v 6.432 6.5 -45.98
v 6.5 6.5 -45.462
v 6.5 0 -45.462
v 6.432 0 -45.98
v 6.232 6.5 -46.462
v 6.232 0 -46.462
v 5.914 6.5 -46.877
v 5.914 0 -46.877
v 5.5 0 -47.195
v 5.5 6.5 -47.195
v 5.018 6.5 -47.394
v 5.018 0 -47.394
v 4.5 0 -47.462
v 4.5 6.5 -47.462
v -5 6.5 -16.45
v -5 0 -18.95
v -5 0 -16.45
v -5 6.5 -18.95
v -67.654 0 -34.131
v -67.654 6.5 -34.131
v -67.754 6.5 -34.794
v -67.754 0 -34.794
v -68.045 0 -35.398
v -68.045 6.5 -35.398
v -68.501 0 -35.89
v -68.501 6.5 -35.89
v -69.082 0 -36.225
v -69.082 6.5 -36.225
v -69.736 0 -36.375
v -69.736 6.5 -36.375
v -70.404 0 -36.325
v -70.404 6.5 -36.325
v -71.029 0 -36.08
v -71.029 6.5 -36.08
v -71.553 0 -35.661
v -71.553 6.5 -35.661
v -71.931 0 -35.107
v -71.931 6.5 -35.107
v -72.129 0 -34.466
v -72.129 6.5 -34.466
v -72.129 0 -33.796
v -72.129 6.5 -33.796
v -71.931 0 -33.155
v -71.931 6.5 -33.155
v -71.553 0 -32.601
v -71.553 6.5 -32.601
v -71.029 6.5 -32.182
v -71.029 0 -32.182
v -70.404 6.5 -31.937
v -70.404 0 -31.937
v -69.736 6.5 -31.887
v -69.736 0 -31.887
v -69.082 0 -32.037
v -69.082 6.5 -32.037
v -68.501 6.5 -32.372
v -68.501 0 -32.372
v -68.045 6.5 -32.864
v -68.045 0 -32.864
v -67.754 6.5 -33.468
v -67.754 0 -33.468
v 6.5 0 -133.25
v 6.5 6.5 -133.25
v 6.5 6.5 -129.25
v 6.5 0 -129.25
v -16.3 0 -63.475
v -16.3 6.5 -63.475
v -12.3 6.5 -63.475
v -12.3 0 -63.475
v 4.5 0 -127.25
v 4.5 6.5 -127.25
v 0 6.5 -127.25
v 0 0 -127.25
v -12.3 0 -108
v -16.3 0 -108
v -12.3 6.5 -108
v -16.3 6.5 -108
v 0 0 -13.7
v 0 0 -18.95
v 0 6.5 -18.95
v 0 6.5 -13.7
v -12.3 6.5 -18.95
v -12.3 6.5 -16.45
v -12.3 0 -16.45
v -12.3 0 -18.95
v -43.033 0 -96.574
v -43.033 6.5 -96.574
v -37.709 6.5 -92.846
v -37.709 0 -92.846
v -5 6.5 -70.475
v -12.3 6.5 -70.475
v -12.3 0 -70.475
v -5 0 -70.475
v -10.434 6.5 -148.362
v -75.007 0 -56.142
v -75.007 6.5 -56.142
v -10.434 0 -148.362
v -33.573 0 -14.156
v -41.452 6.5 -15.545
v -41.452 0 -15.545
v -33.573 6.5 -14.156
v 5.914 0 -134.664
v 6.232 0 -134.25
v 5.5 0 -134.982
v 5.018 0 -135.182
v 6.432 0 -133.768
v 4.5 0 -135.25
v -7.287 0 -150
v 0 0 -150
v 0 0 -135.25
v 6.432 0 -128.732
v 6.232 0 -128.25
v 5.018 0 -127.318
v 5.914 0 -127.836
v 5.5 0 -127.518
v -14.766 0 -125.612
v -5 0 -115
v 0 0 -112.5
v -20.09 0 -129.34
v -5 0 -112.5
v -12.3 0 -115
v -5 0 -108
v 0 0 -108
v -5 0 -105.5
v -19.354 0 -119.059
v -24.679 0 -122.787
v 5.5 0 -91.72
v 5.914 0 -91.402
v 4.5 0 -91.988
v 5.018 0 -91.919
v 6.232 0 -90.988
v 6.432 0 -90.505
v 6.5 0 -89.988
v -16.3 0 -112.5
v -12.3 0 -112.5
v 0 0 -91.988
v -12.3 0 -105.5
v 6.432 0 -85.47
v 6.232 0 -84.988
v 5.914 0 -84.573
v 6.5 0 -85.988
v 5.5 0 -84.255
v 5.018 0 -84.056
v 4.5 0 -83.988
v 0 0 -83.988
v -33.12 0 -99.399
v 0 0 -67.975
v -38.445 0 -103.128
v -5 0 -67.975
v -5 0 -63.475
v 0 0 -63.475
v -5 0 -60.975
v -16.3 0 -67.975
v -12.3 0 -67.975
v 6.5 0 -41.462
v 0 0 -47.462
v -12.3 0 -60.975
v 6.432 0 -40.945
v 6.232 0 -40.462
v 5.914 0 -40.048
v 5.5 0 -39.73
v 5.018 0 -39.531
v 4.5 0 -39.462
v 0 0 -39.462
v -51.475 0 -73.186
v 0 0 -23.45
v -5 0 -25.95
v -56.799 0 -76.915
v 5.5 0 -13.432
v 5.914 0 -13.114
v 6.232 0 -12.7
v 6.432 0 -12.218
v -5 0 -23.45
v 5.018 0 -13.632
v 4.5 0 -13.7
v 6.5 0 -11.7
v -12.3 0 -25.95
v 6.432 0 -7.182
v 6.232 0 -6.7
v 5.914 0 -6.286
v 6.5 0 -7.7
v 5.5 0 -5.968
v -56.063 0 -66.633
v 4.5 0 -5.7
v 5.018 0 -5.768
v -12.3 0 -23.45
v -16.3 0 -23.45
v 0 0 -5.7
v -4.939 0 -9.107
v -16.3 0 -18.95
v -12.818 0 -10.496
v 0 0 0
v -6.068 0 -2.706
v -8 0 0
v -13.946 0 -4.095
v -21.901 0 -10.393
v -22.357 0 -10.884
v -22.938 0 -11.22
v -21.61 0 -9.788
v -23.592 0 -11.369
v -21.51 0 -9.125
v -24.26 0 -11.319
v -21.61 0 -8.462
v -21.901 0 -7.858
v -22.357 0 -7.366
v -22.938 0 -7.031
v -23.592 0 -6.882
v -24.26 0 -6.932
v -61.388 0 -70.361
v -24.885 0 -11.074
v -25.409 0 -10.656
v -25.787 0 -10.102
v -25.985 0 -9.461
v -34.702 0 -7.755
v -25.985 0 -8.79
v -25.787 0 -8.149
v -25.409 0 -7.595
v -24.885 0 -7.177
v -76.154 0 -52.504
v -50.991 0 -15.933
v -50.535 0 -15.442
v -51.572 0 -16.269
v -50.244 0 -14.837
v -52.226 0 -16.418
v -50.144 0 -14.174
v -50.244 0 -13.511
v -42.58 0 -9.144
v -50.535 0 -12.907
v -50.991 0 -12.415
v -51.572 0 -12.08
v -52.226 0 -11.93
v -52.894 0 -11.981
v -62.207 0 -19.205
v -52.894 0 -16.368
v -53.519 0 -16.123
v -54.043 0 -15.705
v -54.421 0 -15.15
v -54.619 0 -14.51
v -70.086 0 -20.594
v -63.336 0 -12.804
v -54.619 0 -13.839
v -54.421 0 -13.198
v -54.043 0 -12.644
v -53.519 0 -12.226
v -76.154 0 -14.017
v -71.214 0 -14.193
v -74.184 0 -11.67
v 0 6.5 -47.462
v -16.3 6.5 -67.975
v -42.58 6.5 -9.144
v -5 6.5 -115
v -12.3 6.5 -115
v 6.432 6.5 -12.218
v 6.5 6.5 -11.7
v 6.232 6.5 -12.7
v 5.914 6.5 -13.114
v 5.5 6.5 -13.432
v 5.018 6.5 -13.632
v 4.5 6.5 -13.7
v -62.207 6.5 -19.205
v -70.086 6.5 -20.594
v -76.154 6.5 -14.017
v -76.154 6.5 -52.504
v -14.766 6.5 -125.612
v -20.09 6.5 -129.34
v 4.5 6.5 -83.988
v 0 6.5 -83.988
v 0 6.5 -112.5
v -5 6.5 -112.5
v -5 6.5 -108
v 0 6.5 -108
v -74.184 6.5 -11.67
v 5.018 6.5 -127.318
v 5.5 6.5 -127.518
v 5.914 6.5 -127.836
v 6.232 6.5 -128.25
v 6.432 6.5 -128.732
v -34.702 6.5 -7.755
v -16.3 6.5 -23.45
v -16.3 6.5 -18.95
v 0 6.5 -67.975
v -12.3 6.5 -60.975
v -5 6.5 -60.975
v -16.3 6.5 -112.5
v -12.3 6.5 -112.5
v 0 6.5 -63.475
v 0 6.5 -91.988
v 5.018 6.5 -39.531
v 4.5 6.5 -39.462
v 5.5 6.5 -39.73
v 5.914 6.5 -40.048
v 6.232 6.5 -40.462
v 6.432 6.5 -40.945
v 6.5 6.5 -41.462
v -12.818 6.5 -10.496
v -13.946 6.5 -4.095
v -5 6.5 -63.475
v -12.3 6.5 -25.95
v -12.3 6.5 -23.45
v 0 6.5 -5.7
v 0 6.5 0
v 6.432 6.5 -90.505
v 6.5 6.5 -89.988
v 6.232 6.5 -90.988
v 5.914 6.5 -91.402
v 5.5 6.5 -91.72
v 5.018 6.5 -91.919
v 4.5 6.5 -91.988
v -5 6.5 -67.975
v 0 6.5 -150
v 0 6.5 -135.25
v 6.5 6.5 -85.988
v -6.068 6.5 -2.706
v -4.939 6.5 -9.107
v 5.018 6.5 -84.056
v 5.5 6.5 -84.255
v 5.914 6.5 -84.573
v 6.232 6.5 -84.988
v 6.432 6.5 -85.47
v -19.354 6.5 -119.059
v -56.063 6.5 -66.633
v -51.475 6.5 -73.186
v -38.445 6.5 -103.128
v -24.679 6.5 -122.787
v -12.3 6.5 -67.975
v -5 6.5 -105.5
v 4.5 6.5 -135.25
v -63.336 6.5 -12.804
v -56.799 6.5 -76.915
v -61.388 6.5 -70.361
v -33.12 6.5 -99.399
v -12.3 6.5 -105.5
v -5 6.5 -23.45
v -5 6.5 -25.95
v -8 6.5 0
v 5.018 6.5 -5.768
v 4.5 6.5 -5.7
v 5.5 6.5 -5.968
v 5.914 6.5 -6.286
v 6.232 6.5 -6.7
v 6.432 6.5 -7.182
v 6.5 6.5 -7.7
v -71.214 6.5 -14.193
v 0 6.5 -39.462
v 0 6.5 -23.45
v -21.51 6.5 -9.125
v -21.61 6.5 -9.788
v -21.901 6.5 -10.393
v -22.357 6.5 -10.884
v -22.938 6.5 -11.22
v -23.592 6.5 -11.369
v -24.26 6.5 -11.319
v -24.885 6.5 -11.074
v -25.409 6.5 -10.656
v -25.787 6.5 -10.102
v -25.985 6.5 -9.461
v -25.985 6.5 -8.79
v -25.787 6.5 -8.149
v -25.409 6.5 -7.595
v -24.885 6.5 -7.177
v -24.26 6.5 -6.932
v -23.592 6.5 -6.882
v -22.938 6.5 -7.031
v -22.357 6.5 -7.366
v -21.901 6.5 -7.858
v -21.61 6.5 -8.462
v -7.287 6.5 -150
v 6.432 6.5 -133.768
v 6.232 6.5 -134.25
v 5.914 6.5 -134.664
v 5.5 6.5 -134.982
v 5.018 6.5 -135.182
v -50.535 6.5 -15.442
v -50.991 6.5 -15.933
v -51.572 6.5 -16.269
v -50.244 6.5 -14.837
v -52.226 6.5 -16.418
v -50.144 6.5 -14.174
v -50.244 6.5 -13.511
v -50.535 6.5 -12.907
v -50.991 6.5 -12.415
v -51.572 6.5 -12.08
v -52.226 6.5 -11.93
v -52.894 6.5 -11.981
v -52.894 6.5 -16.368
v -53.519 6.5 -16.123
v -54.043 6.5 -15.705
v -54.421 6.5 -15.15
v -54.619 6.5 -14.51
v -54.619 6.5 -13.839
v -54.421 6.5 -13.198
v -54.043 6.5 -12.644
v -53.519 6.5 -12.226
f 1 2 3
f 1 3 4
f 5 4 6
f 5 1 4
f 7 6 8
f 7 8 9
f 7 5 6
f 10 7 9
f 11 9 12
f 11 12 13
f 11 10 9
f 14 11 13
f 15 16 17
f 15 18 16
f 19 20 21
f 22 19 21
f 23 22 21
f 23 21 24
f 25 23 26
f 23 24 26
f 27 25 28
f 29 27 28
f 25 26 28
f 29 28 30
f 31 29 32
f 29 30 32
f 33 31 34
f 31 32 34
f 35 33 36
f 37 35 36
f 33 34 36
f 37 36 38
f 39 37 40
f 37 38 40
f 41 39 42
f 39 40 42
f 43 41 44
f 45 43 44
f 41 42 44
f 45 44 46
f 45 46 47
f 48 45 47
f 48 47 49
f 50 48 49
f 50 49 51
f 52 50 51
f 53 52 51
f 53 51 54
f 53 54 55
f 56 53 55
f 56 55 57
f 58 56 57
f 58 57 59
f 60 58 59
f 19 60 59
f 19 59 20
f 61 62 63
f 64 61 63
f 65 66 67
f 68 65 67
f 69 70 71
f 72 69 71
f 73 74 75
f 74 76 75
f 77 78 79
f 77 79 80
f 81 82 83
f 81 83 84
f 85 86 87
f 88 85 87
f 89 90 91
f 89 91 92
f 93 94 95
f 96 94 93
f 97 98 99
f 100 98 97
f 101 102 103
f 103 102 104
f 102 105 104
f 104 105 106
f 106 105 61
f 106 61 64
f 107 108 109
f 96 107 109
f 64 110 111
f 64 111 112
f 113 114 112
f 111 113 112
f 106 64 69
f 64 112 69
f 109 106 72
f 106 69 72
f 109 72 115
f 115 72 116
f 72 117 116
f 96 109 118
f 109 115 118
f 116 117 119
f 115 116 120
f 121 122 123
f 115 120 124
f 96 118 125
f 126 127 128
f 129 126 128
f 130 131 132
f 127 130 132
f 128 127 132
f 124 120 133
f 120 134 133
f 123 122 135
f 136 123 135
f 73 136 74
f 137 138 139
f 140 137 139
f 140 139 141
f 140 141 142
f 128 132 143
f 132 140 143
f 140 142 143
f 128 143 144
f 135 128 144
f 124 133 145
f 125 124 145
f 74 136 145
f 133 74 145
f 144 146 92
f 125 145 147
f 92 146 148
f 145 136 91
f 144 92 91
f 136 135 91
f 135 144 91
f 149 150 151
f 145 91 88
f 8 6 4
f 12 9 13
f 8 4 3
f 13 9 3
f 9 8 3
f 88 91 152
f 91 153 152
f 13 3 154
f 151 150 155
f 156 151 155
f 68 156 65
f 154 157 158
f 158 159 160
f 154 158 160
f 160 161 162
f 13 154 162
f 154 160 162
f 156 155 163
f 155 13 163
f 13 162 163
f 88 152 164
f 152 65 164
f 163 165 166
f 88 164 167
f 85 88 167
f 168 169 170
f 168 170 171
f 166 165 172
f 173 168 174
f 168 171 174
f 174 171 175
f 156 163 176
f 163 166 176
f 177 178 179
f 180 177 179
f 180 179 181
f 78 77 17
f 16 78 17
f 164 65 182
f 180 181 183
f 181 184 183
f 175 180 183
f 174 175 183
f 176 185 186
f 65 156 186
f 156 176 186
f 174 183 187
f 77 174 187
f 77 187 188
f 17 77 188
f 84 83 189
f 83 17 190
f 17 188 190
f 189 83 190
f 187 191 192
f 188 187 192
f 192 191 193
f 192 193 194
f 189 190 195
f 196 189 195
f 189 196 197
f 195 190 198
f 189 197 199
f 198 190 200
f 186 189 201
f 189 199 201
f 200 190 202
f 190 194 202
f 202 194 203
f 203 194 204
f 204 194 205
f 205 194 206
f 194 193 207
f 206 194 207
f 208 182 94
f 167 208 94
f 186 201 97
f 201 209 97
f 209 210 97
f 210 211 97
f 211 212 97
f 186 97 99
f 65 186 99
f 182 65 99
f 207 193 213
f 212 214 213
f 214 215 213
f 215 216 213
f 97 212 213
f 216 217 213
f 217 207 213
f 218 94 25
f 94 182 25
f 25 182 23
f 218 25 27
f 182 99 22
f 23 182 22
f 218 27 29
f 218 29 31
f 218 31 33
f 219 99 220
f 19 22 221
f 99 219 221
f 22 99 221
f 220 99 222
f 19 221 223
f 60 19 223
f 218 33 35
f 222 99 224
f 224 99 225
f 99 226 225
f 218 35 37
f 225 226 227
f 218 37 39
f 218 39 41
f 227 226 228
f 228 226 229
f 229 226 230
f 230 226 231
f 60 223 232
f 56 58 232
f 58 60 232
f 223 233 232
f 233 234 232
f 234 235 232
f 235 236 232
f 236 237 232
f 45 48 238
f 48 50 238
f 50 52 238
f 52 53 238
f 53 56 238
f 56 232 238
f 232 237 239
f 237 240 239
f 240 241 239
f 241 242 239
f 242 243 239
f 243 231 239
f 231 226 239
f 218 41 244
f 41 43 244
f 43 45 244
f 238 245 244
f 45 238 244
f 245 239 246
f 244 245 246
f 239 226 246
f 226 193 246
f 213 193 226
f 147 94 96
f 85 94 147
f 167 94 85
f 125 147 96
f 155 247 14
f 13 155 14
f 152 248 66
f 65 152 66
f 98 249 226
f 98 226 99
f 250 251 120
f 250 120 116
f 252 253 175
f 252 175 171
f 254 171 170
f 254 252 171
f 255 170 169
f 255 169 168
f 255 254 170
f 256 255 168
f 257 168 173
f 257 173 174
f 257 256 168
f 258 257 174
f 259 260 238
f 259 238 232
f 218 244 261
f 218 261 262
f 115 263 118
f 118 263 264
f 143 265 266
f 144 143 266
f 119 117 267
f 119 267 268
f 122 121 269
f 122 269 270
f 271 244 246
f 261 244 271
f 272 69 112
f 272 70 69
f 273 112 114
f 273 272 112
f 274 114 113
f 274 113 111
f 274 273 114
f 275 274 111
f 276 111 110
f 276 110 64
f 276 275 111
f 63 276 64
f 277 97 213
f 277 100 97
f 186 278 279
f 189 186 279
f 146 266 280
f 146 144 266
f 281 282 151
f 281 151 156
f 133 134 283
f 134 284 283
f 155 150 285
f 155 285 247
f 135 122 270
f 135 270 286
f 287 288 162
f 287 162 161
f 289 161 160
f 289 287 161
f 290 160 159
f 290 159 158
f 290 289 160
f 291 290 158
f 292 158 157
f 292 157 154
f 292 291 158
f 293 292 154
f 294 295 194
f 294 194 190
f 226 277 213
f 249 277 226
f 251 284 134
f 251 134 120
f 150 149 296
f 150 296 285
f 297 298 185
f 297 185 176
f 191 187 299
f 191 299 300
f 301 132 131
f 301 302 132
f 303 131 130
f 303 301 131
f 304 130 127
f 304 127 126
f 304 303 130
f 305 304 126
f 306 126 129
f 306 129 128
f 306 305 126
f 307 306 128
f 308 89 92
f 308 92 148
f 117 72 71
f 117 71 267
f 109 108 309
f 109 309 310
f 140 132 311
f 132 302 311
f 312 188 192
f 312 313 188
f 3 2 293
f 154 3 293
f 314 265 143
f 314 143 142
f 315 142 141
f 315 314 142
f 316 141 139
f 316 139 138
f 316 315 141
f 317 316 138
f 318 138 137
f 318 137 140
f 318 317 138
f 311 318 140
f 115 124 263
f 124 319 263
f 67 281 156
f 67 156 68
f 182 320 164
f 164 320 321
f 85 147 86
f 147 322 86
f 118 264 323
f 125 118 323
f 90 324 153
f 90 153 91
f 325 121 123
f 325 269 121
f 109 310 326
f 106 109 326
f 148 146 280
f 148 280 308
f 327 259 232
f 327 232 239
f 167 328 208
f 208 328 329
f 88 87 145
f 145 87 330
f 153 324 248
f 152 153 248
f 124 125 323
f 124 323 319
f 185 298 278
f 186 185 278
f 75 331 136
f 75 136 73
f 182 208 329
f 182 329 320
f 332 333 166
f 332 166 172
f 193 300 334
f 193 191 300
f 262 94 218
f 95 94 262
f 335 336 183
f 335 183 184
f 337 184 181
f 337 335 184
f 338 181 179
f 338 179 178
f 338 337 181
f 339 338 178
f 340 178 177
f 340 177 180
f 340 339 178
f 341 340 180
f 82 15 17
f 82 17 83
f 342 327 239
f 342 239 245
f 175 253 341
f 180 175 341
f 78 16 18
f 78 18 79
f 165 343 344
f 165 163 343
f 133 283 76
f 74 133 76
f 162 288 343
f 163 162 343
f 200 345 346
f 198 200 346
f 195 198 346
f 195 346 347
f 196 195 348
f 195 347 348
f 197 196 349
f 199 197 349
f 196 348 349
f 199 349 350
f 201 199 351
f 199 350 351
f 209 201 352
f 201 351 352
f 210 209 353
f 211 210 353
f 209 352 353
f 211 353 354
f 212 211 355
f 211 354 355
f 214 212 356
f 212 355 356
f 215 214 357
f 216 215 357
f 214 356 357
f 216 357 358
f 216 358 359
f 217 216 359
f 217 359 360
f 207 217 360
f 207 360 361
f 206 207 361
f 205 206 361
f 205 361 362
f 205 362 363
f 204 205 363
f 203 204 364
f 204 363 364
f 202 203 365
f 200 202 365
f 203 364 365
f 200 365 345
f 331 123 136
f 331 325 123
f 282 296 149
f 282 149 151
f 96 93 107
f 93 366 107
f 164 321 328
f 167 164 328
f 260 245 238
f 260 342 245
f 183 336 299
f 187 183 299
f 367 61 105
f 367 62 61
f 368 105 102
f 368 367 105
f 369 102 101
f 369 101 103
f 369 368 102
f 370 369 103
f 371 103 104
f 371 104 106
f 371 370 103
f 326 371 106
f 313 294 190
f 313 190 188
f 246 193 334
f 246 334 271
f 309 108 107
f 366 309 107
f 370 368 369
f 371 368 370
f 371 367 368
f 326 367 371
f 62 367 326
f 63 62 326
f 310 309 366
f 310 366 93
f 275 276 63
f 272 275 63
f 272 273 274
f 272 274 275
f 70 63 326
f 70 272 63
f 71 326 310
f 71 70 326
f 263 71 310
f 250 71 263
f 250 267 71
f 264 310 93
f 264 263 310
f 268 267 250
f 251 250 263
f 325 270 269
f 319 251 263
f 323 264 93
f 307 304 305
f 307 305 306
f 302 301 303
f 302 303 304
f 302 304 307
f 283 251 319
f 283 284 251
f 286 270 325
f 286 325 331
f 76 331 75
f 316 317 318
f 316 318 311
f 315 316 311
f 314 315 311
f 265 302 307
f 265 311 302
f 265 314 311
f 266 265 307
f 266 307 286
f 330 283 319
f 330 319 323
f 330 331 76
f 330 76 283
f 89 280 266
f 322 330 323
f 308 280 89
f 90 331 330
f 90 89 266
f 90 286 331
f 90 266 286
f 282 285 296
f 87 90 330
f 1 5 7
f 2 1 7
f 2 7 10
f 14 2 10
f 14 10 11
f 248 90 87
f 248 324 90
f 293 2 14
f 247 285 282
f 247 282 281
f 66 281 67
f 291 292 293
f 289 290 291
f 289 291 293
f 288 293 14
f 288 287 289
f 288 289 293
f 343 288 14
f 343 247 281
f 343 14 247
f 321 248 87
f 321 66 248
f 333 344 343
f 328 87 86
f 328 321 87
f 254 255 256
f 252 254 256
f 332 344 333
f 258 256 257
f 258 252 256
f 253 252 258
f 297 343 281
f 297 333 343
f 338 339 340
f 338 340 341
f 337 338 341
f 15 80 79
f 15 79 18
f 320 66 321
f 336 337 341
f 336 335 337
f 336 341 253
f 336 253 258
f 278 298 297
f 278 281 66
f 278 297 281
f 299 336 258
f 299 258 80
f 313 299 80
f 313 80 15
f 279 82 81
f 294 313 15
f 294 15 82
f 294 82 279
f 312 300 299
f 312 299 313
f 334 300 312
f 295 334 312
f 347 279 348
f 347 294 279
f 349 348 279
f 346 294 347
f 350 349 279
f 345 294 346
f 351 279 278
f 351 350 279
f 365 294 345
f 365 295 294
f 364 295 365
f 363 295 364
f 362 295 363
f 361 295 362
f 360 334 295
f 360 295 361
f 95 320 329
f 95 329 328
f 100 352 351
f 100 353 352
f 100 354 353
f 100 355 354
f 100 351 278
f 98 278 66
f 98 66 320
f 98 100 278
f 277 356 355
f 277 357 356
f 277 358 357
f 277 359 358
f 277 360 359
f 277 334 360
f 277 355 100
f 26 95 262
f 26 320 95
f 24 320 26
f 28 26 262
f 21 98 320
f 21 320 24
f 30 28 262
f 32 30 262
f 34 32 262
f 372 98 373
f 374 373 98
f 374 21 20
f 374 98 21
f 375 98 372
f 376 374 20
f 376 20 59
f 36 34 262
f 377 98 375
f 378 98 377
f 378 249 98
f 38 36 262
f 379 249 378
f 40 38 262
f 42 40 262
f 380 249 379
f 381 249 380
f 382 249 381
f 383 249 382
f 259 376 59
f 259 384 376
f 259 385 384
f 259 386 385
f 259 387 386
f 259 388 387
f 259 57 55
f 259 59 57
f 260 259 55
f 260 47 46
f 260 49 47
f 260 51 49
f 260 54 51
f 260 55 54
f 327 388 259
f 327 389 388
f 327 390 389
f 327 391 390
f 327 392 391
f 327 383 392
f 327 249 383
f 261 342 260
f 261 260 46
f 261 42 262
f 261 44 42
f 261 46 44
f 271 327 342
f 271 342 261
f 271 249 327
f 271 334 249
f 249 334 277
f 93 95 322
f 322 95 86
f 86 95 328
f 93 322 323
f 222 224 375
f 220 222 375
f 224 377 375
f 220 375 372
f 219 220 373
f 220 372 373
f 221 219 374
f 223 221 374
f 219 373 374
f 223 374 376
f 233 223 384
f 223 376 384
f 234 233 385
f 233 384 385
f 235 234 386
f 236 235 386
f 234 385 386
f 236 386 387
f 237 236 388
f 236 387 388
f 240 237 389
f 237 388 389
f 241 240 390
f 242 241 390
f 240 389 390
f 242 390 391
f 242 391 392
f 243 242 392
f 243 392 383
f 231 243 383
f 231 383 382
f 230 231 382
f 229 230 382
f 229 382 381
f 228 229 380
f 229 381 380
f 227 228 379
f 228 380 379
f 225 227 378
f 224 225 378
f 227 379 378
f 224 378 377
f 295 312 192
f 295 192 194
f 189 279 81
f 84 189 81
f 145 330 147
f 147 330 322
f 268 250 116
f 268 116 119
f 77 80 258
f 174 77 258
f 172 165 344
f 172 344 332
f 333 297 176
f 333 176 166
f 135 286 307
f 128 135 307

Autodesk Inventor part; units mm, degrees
ref_plane "YZ Plane" through (0, 0, 0) normal (1, 0, 0) x (0, 1, 0)
ref_plane "XZ Plane" through (0, 0, 0) normal (0, 1, 0) x (-1, 0, 0)
ref_plane "XY Plane" through (0, 0, 0) normal (0, 0, 1) x (1, 0, 0)
sketch "Sketch1" plane through (0, 0, 0) normal (0, 1, 0) x (-1, 0, 0)
  line L0 (8, 0) -> (76.1537, -12.0173)
  line L1 (76.1537, -12.0173) -> (76.1537, -54.5039)
  line L2 (76.1537, -54.5039) -> (9.2866, -150)
  line L3 (0, -150) -> (0, 0)
  line L4 (75.1537, -50.7018) -> (69.8292, -46.9735) construction
  line L5 (69.8292, -46.9735) -> (1, -145.2718) construction
  line L6 (1, -145.2718) -> (6.3245, -149) construction
  line L7 (6.3245, -149) -> (75.1537, -50.7018) construction
  line L8 (75.1537, -14.8873) -> (74.0249, -21.2885) construction
  line L9 (74.0249, -21.2885) -> (1, -8.4123) construction
  line L10 (1, -8.4123) -> (2.1287, -2.011) construction
  line L11 (2.1287, -2.011) -> (75.1537, -14.8873) construction
  line L12 (73.1537, -45.9735) -> (66.6537, -45.9735) construction
  line L13 (66.6537, -45.9735) -> (66.6537, -22.2885) construction
  line L14 (66.6537, -22.2885) -> (73.1537, -22.2885) construction
  line L15 (73.1537, -22.2885) -> (73.1537, -45.9735) construction
  line L16 (0, -150) -> (9.2866, -150)
  line L17 (0, 0) -> (8, 0)
  line L18 (66.6537, -51.5086) -> (66.6537, -19.9888)
  point P0 (0, 0)
  dimension "d0" = 6.5
  dimension "d1" = 3
  dimension "d2" = 3
  dimension "d3" = 3
  dimension "d4" = 120
  dimension "d5" = 80
  dimension "d6" = 35
  dimension "d7" = 1
  dimension "d8" = 1
  dimension "d9" = 1
  dimension "d10" = 1
  dimension "d12" = 1
  dimension "d13" = 8
  dimension "d14" = 150
extrude "Extrusion1" add sketch "Sketch1" along normal blind 6.5
chamfer "Chamfer1" distance 2 angle 45 3 edges at (-76.1537, 3.25, -54.5039) (-76.1537, 3.25, -12.0173) (-9.2866, 3.25, -150)
sketch "Sketch3" plane through (0, 6.5, 0) normal (0, 1, 0) x (1, 0, 0)
  line L0 (-10.4338, 148.3617) -> (-75.0065, 56.1423) projected
  line L1 (-76.1537, 52.5039) -> (-76.1537, 14.0173) projected
  line L2 (-74.184, 11.67) -> (-8, 0) projected
  line L3 (0, 0) -> (0, 150) projected
  line L4 (0, 150) -> (-7.2866, 150) projected
  line L5 (-6.3245, 149) -> (-1, 145.2718) construction
  line L6 (-1, 145.2718) -> (-69.8292, 46.9735) construction
  line L7 (-69.8292, 46.9735) -> (-75.1537, 50.7018) construction
  line L8 (-75.1537, 50.7018) -> (-6.3245, 149) construction
  line L9 (-73.1537, 45.9735) -> (-66.6537, 45.9735) construction
  line L10 (-66.6537, 45.9735) -> (-66.6537, 22.2885) construction
  line L11 (-66.6537, 22.2885) -> (-73.1537, 22.2885) construction
  line L12 (-73.1537, 22.2885) -> (-73.1537, 45.9735) construction
  line L13 (-74.0249, 21.2885) -> (-75.1537, 14.8873) construction
  line L14 (-75.1537, 14.8873) -> (-2.1287, 2.011) construction
  line L15 (-2.1287, 2.011) -> (-1, 8.4123) construction
  line L16 (-1, 8.4123) -> (-74.0249, 21.2885) construction
  circle A0 centre (-69.9037, 34.131) radius 2.25
  line L17 (-56.0633, 66.6332) -> (-51.4747, 73.1864)
  line L18 (-51.4747, 73.1864) -> (-56.7992, 76.9146)
  line L19 (-56.7992, 76.9146) -> (-61.3878, 70.3614)
  line L20 (-61.3878, 70.3614) -> (-56.0633, 66.6332)
  line L21 (-37.7089, 92.846) -> (-33.1203, 99.3992)
  line L22 (-33.1203, 99.3992) -> (-38.4448, 103.1275)
  line L23 (-38.4448, 103.1275) -> (-43.0334, 96.5743)
  line L24 (-43.0334, 96.5743) -> (-37.7089, 92.846)
  line L25 (-19.3544, 119.0589) -> (-14.7658, 125.6121)
  line L26 (-14.7658, 125.6121) -> (-20.0903, 129.3404)
  line L27 (-20.0903, 129.3404) -> (-24.6789, 122.7871)
  line L28 (-24.6789, 122.7871) -> (-19.3544, 119.0589)
  line L29 (-72.4914, 48.8376) -> (-58.7256, 68.4973) construction
  line L30 (-54.137, 75.0505) -> (-40.3711, 94.7101) construction
  line L31 (-35.7825, 101.2634) -> (-22.0167, 120.923) construction
  line L32 (-17.4281, 127.4762) -> (-3.6622, 147.1359) construction
  line L33 (-16.3, 112.5) -> (-16.3, 108)
  line L34 (0, 108) -> (0, 112.5)
  line L35 (-12.3, 115) -> (-5, 115)
  line L36 (-5, 105.5) -> (-12.3, 105.5)
  line L37 (0, 112.5) -> (-5, 112.5)
  line L38 (-12.3, 112.5) -> (-16.3, 112.5)
  line L39 (-16.3, 108) -> (-12.3, 108)
  line L40 (-5, 108) -> (0, 108)
  line L41 (-12.3, 105.5) -> (-12.3, 108)
  line L42 (-12.3, 112.5) -> (-12.3, 115)
  line L43 (-5, 115) -> (-5, 112.5)
  line L44 (-5, 108) -> (-5, 105.5)
  line L45 (-70.0857, 20.5939) -> (-62.2073, 19.2048)
  line L46 (-62.2073, 19.2048) -> (-63.336, 12.8035)
  line L47 (-63.336, 12.8035) -> (-71.2144, 14.1927)
  line L48 (-71.2144, 14.1927) -> (-70.0857, 20.5939)
  line L49 (-41.4517, 15.545) -> (-33.5732, 14.1558)
  line L50 (-33.5732, 14.1558) -> (-34.702, 7.7546)
  line L51 (-34.702, 7.7546) -> (-42.5804, 9.1437)
  line L52 (-42.5804, 9.1437) -> (-41.4517, 15.545)
  line L53 (-12.8177, 10.496) -> (-4.9392, 9.1069)
  line L54 (-4.9392, 9.1069) -> (-6.0679, 2.7056)
  line L55 (-6.0679, 2.7056) -> (-13.9464, 4.0948)
  line L56 (-13.9464, 4.0948) -> (-12.8177, 10.496)
  line L57 (-62.7716, 16.0041) -> (-42.0161, 12.3444) construction
  line L58 (-34.1376, 10.9552) -> (-13.382, 7.2954) construction
  circle A1 centre (-52.3938, 14.1742) radius 2.25
  circle A2 centre (-23.7598, 9.1253) radius 2.25
  line L59 (-16.3, 67.975) -> (-16.3, 63.475)
  line L60 (0, 63.475) -> (0, 67.975)
  line L61 (-12.3, 70.475) -> (-5, 70.475)
  line L62 (-5, 60.975) -> (-12.3, 60.975)
  line L63 (0, 67.975) -> (-5, 67.975)
  line L64 (-12.3, 67.975) -> (-16.3, 67.975)
  line L65 (-16.3, 63.475) -> (-12.3, 63.475)
  line L66 (-5, 63.475) -> (0, 63.475)
  line L67 (-12.3, 60.975) -> (-12.3, 63.475)
  line L68 (-12.3, 67.975) -> (-12.3, 70.475)
  line L69 (-5, 70.475) -> (-5, 67.975)
  line L70 (-5, 63.475) -> (-5, 60.975)
  line L71 (-16.3, 23.45) -> (-16.3, 18.95)
  line L72 (0, 18.95) -> (0, 23.45)
  line L73 (-12.3, 25.95) -> (-5, 25.95)
  line L74 (-5, 16.45) -> (-12.3, 16.45)
  line L75 (0, 23.45) -> (-5, 23.45)
  line L76 (-12.3, 23.45) -> (-16.3, 23.45)
  line L77 (-16.3, 18.95) -> (-12.3, 18.95)
  line L78 (-5, 18.95) -> (0, 18.95)
  line L79 (-12.3, 16.45) -> (-12.3, 18.95)
  line L80 (-12.3, 23.45) -> (-12.3, 25.95)
  line L81 (-5, 25.95) -> (-5, 23.45)
  line L82 (-5, 18.95) -> (-5, 16.45)
  line L83 (-8.65, 105.5) -> (-8.65, 70.475) construction
  line L84 (-8.65, 60.975) -> (-8.65, 25.95) construction
  line L85 (-8, 0) -> (0, 0) projected
  point P0 (-69.9037, 45.9735)
  point P1 (-73.1537, 34.131)
  point P2 (-16.3, 21.2)
  dimension "d25" = 6.5
  dimension "d26" = 3
  dimension "d27" = 3
  dimension "d28" = 3
  dimension "d29" = 120
  dimension "d30" = 1
  dimension "d31" = 1
  dimension "d32" = 1
  dimension "d33" = 1
  dimension "d34" = 1
  dimension "d35" = 4.5
  dimension "d36" = 8
  dimension "d37" = 4.5
  dimension "d38" = 5
  dimension "d39" = 4
  dimension "d40" = 7.3
  dimension "d41" = 2.5
  dimension "d42" = 4
  dimension "d43" = 4
  dimension "d44" = 4.5
  dimension "d45" = 5
  dimension "d46" = 4
  dimension "d47" = 7.3
  dimension "d48" = 2.5
  dimension "d49" = 4.5
  dimension "d50" = 5
  dimension "d51" = 4
  dimension "d52" = 7.3
  dimension "d53" = 2.5
  dimension "d55" = 35
  dimension "d67" = 21.2
extrude "Extrusion3" cut sketch "Sketch3" against normal through all
sketch "Sketch4" plane through (0, 6.5, 0) normal (0, 1, 0) x (1, 0, 0)
  line L0 (0, 67.975) -> (0, 108) projected
  line L1 (0, 112.5) -> (0, 150) projected
  line L2 (0, 0) -> (0, 18.95) projected
  line L3 (-16.3, 18.95) -> (-16.3, 23.45) projected
  line L4 (0, 23.45) -> (0, 63.475) projected
  line L5 (0, 135.25) -> (4.5, 135.25)
  line L6 (6.5, 133.25) -> (6.5, 129.25)
  line L7 (4.5, 127.25) -> (0, 127.25)
  line L8 (0, 127.25) -> (0, 135.25)
  line L9 (0, 91.9875) -> (4.5, 91.9875)
  line L10 (6.5, 89.9875) -> (6.5, 85.9875)
  line L11 (4.5, 83.9875) -> (0, 83.9875)
  line L12 (0, 83.9875) -> (0, 91.9875)
  line L13 (0, 47.4625) -> (4.5, 47.4625)
  line L14 (6.5, 45.4625) -> (6.5, 41.4625)
  line L15 (4.5, 39.4625) -> (0, 39.4625)
  line L16 (0, 39.4625) -> (0, 47.4625)
  line L17 (0, 13.7) -> (4.5, 13.7)
  line L18 (6.5, 11.7) -> (6.5, 7.7)
  line L19 (4.5, 5.7) -> (0, 5.7)
  line L20 (0, 5.7) -> (0, 13.7)
  arc A0 (6.5, 133.25) -> (4.5, 135.25) centre (4.5, 133.25) ccw
  arc A1 (4.5, 127.25) -> (6.5, 129.25) centre (4.5, 129.25) ccw
  arc A2 (6.5, 89.9875) -> (4.5, 91.9875) centre (4.5, 89.9875) ccw
  arc A3 (4.5, 83.9875) -> (6.5, 85.9875) centre (4.5, 85.9875) ccw
  arc A4 (6.5, 45.4625) -> (4.5, 47.4625) centre (4.5, 45.4625) ccw
  arc A5 (4.5, 39.4625) -> (6.5, 41.4625) centre (4.5, 41.4625) ccw
  arc A6 (6.5, 11.7) -> (4.5, 13.7) centre (4.5, 11.7) ccw
  arc A7 (4.5, 5.7) -> (6.5, 7.7) centre (4.5, 7.7) ccw
  point P0 (-16.3, 21.2)
  point P1 (6.5, 131.25)
  point P2 (0, 131.25)
  point P3 (6.5, 87.9875)
  point P4 (0, 87.9875)
  point P5 (6.5, 43.4625)
  point P6 (0, 43.4625)
  dimension "d58" = 2
  dimension "d59" = 8
  dimension "d60" = 8
  dimension "d61" = 8
  dimension "d62" = 8
  dimension "d63" = 6.5
  dimension "d64" = 7.5
extrude "Extrusion4" add sketch "Sketch4" against normal blind 6.5
equation "\"d60\" = d59"
equation "\"d61\" = d60"
equation "\"d62\" = d61"
properties part number "front_panel_brace_right" material "Plywood, Finish"
